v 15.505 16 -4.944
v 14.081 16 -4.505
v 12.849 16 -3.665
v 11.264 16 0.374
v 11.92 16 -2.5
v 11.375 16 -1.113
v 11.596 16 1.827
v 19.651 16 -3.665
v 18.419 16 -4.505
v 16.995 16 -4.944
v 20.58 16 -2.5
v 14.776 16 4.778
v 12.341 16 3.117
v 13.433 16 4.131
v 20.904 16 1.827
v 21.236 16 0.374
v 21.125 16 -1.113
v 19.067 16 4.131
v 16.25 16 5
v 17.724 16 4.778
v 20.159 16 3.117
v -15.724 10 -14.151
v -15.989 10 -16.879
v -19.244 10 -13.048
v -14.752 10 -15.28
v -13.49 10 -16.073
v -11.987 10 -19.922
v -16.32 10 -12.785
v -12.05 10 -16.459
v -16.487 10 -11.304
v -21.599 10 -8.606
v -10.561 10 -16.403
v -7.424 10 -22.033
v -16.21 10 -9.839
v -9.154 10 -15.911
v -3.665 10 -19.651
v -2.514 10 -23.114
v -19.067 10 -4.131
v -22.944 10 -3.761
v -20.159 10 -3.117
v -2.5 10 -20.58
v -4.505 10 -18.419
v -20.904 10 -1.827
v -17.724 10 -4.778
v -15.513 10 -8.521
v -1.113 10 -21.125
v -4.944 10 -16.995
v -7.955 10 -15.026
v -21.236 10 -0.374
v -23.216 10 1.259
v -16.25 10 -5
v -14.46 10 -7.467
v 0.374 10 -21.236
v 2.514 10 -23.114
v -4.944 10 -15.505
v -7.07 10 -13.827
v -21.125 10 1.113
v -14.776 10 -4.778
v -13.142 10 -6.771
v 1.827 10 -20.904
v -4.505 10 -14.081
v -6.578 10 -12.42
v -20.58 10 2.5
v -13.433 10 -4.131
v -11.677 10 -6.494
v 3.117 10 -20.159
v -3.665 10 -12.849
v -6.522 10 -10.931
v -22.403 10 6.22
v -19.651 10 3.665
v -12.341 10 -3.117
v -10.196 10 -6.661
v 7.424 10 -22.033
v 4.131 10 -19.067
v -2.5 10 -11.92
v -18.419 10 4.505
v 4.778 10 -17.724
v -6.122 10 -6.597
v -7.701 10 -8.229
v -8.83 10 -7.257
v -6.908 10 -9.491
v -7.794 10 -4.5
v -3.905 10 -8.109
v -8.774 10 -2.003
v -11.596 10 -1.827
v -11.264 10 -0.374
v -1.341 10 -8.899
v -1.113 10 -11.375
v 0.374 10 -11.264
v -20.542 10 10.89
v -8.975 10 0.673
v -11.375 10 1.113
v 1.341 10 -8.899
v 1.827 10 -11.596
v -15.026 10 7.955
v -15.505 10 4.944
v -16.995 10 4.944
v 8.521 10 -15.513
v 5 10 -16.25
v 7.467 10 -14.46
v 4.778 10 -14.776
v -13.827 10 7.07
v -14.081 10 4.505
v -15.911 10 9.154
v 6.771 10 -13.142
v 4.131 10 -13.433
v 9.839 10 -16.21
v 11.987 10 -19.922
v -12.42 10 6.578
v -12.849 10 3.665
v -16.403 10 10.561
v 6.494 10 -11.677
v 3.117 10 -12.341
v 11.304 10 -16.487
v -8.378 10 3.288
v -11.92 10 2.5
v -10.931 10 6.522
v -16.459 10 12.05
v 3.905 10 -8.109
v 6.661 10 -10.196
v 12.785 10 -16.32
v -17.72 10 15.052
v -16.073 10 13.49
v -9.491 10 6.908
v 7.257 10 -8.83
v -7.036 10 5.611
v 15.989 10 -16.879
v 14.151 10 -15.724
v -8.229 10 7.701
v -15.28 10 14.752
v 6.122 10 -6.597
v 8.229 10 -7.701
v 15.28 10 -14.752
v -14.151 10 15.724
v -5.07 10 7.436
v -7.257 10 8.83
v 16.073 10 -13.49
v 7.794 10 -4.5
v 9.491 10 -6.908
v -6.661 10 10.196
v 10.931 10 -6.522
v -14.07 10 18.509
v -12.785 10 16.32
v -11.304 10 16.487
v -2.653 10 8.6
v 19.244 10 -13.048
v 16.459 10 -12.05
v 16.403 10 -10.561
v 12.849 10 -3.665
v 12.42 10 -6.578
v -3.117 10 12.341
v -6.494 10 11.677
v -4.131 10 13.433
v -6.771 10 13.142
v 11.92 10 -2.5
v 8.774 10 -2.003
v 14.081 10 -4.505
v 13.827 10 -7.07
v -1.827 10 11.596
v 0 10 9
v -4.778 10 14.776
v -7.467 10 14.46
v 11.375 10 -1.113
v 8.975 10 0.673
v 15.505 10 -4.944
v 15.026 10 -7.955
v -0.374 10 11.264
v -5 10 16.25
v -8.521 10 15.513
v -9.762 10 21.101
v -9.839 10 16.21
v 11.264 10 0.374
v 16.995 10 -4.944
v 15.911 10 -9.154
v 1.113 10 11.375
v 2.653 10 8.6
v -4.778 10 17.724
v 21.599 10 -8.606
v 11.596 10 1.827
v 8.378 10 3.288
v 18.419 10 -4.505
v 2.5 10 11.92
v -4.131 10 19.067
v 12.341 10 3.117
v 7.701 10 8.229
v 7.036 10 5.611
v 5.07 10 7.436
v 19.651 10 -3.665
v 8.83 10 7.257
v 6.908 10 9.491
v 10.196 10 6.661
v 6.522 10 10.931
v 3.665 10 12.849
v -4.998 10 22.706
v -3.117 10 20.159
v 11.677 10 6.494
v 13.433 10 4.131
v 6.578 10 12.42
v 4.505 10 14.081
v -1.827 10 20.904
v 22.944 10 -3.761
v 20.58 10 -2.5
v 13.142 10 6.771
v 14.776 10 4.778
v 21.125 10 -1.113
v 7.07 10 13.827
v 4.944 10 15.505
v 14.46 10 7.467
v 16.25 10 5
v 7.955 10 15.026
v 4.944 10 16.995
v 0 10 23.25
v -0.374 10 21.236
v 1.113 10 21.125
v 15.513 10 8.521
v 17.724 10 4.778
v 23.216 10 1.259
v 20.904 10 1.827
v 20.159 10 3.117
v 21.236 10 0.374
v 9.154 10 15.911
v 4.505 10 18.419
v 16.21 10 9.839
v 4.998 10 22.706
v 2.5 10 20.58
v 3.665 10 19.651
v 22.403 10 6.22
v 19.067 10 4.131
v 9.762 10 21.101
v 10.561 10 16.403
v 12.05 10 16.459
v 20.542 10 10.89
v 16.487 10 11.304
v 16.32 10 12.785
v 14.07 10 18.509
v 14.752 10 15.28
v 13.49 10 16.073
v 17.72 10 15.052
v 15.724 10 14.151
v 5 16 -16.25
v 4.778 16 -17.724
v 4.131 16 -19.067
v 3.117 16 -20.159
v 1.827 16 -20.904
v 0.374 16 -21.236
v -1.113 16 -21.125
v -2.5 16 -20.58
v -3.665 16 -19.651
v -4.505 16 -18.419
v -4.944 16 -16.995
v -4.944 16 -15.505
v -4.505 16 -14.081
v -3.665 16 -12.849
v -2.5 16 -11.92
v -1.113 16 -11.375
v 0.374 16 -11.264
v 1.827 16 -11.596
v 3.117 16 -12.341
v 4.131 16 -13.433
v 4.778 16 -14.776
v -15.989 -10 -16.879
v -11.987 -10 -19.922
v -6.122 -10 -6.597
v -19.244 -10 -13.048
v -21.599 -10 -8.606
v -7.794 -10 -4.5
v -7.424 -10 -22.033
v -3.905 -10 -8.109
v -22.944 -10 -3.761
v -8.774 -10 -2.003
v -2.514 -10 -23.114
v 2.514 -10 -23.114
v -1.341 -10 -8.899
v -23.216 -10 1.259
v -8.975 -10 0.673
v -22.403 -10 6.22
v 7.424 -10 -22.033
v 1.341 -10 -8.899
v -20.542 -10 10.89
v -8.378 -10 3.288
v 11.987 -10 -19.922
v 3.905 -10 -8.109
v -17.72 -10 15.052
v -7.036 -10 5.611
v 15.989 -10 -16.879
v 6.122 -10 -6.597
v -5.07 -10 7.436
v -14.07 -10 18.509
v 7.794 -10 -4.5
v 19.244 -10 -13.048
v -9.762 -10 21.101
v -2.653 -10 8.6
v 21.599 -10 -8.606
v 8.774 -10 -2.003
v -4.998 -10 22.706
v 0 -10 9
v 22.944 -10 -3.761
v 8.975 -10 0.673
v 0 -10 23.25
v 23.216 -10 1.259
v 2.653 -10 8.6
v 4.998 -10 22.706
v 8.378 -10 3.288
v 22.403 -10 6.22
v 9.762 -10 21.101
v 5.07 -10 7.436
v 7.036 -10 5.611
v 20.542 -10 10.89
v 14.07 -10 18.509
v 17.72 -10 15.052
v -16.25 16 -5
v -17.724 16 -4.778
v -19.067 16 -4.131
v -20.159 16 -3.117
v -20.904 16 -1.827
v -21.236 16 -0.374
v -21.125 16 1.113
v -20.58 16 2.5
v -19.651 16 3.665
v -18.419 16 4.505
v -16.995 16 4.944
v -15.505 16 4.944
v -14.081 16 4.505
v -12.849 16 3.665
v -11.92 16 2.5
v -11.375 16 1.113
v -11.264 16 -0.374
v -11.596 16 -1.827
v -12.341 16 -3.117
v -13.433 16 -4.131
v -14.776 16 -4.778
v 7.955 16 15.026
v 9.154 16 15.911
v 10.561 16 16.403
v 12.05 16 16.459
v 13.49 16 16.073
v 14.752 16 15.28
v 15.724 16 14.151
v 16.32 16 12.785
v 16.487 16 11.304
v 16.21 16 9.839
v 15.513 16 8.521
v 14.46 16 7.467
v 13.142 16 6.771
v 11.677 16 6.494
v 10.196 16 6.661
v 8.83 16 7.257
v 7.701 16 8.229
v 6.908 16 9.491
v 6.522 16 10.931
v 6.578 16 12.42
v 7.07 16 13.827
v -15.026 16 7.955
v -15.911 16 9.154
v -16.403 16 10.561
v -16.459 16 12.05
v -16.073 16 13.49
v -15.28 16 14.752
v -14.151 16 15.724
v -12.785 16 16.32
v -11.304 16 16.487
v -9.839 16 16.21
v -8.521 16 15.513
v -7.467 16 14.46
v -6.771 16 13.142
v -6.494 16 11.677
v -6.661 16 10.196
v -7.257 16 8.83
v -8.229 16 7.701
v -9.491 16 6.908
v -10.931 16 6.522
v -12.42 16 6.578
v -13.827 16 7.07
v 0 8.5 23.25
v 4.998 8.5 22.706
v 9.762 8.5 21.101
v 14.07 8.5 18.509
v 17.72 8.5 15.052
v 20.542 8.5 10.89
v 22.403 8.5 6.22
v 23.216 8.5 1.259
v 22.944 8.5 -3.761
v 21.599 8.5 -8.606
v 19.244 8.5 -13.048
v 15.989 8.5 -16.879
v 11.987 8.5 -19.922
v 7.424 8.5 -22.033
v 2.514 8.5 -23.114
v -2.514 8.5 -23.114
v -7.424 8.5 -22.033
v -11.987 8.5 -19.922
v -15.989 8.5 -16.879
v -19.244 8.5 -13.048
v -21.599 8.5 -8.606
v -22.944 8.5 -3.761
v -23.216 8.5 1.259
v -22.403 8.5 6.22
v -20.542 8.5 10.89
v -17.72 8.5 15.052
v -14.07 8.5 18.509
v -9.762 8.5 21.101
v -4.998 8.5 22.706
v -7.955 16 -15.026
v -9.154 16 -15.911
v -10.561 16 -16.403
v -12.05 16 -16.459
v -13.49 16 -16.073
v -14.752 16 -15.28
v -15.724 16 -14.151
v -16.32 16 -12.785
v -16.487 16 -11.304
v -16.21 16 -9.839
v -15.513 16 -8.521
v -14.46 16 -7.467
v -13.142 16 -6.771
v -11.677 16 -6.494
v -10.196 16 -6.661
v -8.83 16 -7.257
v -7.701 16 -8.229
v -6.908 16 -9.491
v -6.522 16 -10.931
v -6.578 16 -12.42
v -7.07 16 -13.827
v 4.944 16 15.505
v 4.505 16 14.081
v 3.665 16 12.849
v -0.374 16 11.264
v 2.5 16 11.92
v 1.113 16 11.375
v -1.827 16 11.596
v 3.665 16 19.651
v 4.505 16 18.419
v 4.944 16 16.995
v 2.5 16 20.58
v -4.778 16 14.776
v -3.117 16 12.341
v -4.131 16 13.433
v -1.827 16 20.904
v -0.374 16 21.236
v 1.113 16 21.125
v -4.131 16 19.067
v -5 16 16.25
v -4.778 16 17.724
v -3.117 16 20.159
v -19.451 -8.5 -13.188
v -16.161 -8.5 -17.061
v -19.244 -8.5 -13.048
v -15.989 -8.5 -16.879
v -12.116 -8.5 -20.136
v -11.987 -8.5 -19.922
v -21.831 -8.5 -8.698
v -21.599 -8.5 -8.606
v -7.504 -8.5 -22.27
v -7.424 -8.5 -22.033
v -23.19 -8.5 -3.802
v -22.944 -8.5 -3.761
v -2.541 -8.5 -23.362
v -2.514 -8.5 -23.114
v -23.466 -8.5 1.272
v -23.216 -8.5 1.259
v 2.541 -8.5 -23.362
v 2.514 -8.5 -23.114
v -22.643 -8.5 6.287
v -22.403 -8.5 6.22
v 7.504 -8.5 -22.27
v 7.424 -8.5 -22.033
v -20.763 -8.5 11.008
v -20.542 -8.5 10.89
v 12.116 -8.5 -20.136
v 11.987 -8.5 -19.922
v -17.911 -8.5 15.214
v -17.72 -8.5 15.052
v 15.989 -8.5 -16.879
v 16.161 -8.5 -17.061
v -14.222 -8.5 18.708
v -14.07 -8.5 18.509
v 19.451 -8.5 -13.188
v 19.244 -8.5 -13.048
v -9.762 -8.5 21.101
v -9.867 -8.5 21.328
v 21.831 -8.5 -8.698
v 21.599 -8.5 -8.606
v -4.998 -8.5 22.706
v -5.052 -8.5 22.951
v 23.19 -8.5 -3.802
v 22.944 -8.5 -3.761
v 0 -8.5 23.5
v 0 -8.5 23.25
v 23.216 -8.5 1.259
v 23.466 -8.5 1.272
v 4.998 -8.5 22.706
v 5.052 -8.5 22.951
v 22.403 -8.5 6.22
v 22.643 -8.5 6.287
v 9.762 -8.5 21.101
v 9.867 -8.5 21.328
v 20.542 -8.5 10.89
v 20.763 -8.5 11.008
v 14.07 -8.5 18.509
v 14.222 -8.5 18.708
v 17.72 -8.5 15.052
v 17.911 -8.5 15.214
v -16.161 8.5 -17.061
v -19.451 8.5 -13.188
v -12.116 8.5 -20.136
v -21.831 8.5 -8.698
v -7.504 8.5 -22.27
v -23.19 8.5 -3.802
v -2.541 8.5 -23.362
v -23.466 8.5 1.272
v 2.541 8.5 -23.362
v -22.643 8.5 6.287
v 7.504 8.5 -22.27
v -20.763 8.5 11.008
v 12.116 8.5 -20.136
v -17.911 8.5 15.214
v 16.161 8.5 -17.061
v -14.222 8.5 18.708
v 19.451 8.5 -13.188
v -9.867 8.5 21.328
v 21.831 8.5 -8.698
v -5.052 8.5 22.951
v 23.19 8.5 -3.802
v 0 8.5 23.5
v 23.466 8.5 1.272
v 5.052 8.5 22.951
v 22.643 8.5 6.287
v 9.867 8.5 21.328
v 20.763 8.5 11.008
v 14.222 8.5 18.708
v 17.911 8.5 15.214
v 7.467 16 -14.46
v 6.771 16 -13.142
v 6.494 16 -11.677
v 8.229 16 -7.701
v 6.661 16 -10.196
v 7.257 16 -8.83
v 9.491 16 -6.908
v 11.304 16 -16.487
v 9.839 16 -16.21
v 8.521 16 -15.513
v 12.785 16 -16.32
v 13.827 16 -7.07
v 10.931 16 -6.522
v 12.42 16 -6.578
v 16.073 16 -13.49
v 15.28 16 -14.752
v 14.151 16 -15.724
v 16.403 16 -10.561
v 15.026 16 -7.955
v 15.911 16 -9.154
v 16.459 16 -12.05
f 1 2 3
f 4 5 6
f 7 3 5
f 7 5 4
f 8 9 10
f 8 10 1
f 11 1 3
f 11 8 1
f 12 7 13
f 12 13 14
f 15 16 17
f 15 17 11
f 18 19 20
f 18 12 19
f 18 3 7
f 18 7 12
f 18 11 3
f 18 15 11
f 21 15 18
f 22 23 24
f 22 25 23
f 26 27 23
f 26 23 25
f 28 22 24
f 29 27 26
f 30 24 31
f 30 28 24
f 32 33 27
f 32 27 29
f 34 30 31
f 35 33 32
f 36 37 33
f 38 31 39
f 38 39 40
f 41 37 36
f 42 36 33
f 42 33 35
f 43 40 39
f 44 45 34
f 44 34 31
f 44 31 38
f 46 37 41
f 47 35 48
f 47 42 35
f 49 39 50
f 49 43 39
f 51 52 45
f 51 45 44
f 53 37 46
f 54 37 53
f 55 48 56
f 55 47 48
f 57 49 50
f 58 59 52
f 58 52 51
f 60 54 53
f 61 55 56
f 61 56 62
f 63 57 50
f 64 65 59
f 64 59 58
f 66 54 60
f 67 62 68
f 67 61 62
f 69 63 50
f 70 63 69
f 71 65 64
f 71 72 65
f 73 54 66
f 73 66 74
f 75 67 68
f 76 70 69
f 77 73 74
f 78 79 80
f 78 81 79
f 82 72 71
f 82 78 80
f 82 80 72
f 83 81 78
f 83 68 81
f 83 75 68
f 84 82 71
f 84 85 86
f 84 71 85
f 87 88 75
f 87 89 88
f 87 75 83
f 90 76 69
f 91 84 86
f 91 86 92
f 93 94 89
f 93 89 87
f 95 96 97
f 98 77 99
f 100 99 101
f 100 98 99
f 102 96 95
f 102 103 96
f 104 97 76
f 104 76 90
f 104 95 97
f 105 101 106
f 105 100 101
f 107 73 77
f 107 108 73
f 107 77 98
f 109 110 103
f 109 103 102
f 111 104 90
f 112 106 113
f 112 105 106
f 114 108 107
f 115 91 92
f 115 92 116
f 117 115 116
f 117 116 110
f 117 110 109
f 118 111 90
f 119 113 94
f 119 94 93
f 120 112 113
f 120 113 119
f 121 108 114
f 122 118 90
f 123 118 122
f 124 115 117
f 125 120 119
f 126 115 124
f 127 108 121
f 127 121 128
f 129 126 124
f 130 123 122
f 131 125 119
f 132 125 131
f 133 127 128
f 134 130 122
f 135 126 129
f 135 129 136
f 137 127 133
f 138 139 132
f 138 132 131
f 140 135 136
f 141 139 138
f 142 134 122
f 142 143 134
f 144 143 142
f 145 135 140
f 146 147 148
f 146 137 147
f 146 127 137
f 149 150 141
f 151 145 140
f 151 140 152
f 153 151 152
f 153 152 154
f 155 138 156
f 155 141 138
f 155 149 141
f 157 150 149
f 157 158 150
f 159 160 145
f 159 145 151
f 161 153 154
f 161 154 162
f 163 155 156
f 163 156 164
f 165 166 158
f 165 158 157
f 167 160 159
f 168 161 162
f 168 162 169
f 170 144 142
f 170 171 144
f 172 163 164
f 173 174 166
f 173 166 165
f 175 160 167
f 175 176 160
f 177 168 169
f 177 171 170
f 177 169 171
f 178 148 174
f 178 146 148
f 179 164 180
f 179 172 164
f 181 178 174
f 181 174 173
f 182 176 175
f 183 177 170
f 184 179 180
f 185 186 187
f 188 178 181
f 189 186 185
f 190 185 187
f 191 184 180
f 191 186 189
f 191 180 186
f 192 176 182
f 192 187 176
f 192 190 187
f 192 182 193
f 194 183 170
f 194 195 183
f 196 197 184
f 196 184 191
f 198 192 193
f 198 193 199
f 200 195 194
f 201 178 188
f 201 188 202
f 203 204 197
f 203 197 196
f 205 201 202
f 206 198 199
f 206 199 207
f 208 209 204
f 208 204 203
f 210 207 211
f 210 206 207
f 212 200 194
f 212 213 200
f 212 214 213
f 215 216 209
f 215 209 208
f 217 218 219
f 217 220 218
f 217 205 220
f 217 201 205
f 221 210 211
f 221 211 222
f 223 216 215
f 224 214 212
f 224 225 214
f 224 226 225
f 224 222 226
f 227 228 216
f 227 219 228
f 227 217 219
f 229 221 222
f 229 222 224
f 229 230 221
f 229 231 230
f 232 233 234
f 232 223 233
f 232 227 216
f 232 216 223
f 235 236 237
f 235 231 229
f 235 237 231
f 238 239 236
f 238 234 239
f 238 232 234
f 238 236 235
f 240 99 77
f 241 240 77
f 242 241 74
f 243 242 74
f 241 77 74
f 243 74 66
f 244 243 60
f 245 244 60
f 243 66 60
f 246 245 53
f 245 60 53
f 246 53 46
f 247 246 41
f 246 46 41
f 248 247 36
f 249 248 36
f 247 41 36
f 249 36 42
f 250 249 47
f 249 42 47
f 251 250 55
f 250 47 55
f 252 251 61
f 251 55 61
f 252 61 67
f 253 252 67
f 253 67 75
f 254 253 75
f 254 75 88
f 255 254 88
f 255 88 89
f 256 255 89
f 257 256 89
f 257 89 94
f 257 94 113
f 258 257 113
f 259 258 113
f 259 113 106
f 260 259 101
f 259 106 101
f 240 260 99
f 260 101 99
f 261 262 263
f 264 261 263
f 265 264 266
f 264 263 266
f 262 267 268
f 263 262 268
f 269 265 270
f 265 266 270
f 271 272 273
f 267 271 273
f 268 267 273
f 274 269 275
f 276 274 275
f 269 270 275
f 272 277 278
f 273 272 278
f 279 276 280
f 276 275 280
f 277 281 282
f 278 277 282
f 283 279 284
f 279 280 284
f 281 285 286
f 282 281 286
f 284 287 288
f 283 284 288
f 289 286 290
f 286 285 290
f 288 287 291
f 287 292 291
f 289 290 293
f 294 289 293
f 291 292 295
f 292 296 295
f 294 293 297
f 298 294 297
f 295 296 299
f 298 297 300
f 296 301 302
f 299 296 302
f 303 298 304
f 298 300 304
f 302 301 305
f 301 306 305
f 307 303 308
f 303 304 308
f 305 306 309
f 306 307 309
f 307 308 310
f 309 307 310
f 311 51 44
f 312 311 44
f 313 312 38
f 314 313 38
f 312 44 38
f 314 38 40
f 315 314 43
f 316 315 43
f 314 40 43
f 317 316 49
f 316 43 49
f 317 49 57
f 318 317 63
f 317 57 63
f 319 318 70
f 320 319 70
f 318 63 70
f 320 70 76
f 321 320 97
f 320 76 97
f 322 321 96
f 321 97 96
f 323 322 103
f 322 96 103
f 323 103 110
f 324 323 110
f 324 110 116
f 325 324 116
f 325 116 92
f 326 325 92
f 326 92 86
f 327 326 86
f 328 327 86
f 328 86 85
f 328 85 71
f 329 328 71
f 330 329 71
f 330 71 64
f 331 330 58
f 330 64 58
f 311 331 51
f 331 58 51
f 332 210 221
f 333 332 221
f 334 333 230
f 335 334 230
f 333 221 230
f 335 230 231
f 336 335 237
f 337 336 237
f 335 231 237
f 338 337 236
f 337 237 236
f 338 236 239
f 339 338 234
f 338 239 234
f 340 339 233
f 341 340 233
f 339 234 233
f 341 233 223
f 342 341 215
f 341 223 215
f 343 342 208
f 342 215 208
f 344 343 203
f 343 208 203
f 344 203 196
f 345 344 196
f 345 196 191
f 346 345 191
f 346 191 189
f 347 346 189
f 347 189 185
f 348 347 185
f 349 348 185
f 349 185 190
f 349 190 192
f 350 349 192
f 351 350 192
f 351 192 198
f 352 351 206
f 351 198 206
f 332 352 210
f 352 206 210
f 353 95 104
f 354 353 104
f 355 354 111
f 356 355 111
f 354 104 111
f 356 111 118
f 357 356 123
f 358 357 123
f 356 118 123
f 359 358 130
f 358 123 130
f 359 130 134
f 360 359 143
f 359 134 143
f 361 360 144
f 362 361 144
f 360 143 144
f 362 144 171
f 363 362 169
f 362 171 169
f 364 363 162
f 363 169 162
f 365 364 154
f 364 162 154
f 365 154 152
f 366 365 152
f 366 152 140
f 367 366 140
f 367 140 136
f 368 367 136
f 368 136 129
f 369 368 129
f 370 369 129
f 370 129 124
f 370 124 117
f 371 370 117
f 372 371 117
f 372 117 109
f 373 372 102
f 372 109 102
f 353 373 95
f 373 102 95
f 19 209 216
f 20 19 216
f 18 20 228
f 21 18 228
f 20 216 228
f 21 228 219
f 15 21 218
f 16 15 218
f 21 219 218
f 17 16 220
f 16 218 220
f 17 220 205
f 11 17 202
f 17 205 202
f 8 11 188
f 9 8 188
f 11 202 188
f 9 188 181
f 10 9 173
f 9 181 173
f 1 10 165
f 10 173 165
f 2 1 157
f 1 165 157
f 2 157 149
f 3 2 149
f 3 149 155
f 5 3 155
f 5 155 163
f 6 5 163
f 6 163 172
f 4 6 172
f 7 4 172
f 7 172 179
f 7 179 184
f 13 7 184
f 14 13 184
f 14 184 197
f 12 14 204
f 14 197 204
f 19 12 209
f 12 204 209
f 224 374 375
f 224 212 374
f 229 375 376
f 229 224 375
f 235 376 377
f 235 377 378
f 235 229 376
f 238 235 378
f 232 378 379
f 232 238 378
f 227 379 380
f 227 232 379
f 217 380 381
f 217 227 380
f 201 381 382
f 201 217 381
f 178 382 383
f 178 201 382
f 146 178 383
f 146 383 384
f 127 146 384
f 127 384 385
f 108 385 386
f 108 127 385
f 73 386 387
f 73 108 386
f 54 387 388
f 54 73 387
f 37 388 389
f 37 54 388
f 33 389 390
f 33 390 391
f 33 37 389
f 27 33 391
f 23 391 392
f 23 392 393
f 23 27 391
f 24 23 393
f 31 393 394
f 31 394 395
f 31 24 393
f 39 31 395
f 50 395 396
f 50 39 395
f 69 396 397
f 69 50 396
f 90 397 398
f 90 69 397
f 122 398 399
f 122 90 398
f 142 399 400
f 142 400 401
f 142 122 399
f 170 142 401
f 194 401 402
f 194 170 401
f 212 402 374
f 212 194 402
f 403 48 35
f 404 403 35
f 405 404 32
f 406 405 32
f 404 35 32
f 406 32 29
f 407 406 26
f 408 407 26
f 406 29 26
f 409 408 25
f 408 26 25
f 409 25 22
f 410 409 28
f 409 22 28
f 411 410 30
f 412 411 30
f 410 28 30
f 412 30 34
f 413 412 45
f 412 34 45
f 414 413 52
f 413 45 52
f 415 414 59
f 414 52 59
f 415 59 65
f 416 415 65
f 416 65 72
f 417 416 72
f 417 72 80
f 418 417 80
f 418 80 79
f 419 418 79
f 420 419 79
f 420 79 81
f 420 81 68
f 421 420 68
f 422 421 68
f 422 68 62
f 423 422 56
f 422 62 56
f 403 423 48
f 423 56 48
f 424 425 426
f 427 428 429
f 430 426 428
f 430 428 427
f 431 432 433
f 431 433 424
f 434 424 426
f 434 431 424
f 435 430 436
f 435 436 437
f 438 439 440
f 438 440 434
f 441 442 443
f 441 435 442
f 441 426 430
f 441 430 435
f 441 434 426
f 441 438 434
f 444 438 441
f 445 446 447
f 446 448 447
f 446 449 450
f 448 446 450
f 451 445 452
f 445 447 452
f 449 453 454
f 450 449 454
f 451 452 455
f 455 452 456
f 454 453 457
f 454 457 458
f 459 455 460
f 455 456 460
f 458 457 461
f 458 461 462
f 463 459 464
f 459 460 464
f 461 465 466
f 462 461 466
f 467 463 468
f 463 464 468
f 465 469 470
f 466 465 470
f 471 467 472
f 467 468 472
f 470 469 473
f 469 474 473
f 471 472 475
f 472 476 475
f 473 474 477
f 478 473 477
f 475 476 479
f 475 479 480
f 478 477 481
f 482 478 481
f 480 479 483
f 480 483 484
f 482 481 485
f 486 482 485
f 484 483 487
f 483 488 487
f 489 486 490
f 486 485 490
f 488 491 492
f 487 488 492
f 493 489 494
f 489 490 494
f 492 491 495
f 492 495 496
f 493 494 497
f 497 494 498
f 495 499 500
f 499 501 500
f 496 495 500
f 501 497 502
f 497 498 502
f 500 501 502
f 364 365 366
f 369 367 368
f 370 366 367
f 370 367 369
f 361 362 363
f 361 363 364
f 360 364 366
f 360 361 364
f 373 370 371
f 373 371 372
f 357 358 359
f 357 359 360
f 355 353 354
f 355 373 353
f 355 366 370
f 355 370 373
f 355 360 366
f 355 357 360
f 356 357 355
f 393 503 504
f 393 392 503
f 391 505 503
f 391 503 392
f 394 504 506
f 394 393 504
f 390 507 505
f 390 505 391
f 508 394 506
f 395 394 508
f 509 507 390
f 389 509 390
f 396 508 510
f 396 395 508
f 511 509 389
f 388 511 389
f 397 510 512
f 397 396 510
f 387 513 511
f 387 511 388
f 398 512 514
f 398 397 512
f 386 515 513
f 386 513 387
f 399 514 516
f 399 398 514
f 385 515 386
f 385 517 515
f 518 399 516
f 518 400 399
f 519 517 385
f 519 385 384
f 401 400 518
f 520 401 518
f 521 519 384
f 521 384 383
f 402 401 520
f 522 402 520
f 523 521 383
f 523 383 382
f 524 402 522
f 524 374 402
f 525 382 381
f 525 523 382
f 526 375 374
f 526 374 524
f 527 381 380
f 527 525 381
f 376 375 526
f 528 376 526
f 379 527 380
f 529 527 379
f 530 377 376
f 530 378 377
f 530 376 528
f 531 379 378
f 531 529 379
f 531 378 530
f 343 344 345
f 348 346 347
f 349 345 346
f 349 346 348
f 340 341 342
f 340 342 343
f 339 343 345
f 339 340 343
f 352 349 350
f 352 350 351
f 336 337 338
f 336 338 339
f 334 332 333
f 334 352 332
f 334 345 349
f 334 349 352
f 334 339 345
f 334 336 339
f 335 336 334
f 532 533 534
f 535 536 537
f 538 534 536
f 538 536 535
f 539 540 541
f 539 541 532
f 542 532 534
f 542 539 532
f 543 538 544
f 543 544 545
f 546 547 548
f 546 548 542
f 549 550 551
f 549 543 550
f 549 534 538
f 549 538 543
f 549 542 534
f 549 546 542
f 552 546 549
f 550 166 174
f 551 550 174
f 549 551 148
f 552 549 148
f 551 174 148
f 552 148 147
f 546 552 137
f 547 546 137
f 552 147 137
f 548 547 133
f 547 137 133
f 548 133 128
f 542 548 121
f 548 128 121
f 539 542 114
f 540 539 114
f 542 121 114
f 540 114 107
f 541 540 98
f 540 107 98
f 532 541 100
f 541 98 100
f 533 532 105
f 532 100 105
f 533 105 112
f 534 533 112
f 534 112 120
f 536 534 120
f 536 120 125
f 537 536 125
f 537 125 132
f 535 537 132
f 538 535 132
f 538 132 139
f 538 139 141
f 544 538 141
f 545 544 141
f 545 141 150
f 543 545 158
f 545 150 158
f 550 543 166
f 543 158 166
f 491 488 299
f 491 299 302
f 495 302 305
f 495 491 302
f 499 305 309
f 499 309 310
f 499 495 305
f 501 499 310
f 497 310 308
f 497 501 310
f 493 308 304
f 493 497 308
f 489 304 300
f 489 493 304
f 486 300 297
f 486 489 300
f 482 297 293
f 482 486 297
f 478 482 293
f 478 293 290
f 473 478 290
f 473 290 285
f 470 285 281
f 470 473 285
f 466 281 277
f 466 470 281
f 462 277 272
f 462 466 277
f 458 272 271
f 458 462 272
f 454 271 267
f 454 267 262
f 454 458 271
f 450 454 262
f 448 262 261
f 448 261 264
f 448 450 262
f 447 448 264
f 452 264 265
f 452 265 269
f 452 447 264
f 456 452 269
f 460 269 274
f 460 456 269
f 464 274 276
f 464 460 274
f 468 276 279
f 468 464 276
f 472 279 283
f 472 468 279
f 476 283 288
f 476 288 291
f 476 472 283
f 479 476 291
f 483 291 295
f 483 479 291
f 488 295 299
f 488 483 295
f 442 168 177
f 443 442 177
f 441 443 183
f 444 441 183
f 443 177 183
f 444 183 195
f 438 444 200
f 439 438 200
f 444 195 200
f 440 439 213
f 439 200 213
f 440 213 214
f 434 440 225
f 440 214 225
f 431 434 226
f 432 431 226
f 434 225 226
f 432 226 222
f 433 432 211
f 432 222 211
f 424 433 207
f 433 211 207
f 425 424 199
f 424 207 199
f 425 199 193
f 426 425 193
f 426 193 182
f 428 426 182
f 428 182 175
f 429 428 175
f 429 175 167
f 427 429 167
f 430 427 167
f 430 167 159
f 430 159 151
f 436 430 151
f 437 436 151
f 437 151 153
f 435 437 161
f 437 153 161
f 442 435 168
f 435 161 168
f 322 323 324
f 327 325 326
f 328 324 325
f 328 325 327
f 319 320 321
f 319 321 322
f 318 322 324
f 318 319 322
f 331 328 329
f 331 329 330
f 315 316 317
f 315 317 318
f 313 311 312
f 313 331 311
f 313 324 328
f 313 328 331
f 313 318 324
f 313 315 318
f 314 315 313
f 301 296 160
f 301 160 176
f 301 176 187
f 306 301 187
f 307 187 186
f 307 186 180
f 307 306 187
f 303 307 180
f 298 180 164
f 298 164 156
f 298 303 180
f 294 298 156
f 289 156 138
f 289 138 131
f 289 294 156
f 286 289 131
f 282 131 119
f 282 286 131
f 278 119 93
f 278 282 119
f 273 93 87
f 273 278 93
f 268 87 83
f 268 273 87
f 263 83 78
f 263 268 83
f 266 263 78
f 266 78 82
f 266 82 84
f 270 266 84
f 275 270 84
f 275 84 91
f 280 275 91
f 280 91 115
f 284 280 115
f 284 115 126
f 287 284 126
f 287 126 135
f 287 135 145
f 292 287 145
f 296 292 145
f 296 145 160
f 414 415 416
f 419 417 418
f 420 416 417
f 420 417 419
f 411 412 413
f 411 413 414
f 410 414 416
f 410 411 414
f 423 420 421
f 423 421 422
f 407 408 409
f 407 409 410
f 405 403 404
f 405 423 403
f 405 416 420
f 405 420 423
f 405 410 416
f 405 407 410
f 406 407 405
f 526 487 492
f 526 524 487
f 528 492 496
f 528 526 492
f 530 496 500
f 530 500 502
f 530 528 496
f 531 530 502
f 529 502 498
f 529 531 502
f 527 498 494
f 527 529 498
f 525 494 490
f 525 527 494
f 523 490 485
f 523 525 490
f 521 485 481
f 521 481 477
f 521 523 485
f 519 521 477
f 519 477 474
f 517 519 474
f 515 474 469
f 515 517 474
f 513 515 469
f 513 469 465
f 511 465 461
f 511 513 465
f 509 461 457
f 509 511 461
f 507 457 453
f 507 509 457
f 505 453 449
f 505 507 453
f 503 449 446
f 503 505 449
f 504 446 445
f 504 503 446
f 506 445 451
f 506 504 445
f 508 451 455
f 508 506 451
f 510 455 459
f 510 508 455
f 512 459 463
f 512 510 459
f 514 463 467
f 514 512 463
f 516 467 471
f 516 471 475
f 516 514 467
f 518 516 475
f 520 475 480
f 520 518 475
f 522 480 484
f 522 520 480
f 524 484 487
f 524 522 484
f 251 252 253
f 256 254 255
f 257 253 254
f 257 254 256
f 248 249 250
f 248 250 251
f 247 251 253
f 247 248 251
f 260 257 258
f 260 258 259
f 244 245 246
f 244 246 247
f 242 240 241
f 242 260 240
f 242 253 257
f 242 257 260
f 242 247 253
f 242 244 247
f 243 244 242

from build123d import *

# Parameters (mm, degrees)
SKETCH_1_R               = 23.25
SKETCH_1_R_2             = 9
EXTRUDE_1_DEPTH          = 10
SKETCH_2_R               = 5
EXTRUDE_2_DEPTH          = 6
PATTERN_CIRCULAR_1_COUNT = 8
SKETCH_4_R               = 23.5
SKETCH_4_R_2             = 9
EXTRUDE_3_DEPTH          = 8.5


with BuildPart() as part:
    # 草图1 → 凸台-拉伸1 (new, symmetric)
    with BuildSketch(Plane(origin=(0, 0, 0), x_dir=(1, 0, 0), z_dir=(0, 1, 0))):
        with Locations(Location((0, 0, 0), (0, 0, 270))):
            Circle(SKETCH_1_R)
        with Locations(Location((0, 0, 0), (0, 0, 270))):
            Circle(SKETCH_1_R_2, mode=Mode.SUBTRACT)
    extrude(amount=EXTRUDE_1_DEPTH, both=True)

    # 草图2 → 凸台-拉伸2 (add)
    with BuildSketch(Plane(origin=(0, 10, 0), x_dir=(1, 0, 0), z_dir=(0, 1, 0))):
        with Locations(Location((16.25, 0, 0), (0, 0, 270))):
            Circle(SKETCH_2_R)
    extrude_2 = extrude(amount=EXTRUDE_2_DEPTH)

    # 阵列(圆周)1: 凸台-拉伸2 ×8 about axis
    pattern_circular_1_axis = Axis((0, 0, 0), (0, 1, 0))
    for i in range(1, PATTERN_CIRCULAR_1_COUNT):
        add(extrude_2.rotate(pattern_circular_1_axis, i * 360 / PATTERN_CIRCULAR_1_COUNT))

    # 草图4 → 凸台-拉伸3 (add, symmetric)
    with BuildSketch(Plane(origin=(0, 0, 0), x_dir=(1, 0, 0), z_dir=(0, 1, 0))):
        with Locations(Location((0, 0, 0), (0, 0, 270))):
            Circle(SKETCH_4_R)
        with Locations(Location((0, 0, 0), (0, 0, 270))):
            Circle(SKETCH_4_R_2, mode=Mode.SUBTRACT)
    extrude(amount=EXTRUDE_3_DEPTH, both=True)


solid = part.part
